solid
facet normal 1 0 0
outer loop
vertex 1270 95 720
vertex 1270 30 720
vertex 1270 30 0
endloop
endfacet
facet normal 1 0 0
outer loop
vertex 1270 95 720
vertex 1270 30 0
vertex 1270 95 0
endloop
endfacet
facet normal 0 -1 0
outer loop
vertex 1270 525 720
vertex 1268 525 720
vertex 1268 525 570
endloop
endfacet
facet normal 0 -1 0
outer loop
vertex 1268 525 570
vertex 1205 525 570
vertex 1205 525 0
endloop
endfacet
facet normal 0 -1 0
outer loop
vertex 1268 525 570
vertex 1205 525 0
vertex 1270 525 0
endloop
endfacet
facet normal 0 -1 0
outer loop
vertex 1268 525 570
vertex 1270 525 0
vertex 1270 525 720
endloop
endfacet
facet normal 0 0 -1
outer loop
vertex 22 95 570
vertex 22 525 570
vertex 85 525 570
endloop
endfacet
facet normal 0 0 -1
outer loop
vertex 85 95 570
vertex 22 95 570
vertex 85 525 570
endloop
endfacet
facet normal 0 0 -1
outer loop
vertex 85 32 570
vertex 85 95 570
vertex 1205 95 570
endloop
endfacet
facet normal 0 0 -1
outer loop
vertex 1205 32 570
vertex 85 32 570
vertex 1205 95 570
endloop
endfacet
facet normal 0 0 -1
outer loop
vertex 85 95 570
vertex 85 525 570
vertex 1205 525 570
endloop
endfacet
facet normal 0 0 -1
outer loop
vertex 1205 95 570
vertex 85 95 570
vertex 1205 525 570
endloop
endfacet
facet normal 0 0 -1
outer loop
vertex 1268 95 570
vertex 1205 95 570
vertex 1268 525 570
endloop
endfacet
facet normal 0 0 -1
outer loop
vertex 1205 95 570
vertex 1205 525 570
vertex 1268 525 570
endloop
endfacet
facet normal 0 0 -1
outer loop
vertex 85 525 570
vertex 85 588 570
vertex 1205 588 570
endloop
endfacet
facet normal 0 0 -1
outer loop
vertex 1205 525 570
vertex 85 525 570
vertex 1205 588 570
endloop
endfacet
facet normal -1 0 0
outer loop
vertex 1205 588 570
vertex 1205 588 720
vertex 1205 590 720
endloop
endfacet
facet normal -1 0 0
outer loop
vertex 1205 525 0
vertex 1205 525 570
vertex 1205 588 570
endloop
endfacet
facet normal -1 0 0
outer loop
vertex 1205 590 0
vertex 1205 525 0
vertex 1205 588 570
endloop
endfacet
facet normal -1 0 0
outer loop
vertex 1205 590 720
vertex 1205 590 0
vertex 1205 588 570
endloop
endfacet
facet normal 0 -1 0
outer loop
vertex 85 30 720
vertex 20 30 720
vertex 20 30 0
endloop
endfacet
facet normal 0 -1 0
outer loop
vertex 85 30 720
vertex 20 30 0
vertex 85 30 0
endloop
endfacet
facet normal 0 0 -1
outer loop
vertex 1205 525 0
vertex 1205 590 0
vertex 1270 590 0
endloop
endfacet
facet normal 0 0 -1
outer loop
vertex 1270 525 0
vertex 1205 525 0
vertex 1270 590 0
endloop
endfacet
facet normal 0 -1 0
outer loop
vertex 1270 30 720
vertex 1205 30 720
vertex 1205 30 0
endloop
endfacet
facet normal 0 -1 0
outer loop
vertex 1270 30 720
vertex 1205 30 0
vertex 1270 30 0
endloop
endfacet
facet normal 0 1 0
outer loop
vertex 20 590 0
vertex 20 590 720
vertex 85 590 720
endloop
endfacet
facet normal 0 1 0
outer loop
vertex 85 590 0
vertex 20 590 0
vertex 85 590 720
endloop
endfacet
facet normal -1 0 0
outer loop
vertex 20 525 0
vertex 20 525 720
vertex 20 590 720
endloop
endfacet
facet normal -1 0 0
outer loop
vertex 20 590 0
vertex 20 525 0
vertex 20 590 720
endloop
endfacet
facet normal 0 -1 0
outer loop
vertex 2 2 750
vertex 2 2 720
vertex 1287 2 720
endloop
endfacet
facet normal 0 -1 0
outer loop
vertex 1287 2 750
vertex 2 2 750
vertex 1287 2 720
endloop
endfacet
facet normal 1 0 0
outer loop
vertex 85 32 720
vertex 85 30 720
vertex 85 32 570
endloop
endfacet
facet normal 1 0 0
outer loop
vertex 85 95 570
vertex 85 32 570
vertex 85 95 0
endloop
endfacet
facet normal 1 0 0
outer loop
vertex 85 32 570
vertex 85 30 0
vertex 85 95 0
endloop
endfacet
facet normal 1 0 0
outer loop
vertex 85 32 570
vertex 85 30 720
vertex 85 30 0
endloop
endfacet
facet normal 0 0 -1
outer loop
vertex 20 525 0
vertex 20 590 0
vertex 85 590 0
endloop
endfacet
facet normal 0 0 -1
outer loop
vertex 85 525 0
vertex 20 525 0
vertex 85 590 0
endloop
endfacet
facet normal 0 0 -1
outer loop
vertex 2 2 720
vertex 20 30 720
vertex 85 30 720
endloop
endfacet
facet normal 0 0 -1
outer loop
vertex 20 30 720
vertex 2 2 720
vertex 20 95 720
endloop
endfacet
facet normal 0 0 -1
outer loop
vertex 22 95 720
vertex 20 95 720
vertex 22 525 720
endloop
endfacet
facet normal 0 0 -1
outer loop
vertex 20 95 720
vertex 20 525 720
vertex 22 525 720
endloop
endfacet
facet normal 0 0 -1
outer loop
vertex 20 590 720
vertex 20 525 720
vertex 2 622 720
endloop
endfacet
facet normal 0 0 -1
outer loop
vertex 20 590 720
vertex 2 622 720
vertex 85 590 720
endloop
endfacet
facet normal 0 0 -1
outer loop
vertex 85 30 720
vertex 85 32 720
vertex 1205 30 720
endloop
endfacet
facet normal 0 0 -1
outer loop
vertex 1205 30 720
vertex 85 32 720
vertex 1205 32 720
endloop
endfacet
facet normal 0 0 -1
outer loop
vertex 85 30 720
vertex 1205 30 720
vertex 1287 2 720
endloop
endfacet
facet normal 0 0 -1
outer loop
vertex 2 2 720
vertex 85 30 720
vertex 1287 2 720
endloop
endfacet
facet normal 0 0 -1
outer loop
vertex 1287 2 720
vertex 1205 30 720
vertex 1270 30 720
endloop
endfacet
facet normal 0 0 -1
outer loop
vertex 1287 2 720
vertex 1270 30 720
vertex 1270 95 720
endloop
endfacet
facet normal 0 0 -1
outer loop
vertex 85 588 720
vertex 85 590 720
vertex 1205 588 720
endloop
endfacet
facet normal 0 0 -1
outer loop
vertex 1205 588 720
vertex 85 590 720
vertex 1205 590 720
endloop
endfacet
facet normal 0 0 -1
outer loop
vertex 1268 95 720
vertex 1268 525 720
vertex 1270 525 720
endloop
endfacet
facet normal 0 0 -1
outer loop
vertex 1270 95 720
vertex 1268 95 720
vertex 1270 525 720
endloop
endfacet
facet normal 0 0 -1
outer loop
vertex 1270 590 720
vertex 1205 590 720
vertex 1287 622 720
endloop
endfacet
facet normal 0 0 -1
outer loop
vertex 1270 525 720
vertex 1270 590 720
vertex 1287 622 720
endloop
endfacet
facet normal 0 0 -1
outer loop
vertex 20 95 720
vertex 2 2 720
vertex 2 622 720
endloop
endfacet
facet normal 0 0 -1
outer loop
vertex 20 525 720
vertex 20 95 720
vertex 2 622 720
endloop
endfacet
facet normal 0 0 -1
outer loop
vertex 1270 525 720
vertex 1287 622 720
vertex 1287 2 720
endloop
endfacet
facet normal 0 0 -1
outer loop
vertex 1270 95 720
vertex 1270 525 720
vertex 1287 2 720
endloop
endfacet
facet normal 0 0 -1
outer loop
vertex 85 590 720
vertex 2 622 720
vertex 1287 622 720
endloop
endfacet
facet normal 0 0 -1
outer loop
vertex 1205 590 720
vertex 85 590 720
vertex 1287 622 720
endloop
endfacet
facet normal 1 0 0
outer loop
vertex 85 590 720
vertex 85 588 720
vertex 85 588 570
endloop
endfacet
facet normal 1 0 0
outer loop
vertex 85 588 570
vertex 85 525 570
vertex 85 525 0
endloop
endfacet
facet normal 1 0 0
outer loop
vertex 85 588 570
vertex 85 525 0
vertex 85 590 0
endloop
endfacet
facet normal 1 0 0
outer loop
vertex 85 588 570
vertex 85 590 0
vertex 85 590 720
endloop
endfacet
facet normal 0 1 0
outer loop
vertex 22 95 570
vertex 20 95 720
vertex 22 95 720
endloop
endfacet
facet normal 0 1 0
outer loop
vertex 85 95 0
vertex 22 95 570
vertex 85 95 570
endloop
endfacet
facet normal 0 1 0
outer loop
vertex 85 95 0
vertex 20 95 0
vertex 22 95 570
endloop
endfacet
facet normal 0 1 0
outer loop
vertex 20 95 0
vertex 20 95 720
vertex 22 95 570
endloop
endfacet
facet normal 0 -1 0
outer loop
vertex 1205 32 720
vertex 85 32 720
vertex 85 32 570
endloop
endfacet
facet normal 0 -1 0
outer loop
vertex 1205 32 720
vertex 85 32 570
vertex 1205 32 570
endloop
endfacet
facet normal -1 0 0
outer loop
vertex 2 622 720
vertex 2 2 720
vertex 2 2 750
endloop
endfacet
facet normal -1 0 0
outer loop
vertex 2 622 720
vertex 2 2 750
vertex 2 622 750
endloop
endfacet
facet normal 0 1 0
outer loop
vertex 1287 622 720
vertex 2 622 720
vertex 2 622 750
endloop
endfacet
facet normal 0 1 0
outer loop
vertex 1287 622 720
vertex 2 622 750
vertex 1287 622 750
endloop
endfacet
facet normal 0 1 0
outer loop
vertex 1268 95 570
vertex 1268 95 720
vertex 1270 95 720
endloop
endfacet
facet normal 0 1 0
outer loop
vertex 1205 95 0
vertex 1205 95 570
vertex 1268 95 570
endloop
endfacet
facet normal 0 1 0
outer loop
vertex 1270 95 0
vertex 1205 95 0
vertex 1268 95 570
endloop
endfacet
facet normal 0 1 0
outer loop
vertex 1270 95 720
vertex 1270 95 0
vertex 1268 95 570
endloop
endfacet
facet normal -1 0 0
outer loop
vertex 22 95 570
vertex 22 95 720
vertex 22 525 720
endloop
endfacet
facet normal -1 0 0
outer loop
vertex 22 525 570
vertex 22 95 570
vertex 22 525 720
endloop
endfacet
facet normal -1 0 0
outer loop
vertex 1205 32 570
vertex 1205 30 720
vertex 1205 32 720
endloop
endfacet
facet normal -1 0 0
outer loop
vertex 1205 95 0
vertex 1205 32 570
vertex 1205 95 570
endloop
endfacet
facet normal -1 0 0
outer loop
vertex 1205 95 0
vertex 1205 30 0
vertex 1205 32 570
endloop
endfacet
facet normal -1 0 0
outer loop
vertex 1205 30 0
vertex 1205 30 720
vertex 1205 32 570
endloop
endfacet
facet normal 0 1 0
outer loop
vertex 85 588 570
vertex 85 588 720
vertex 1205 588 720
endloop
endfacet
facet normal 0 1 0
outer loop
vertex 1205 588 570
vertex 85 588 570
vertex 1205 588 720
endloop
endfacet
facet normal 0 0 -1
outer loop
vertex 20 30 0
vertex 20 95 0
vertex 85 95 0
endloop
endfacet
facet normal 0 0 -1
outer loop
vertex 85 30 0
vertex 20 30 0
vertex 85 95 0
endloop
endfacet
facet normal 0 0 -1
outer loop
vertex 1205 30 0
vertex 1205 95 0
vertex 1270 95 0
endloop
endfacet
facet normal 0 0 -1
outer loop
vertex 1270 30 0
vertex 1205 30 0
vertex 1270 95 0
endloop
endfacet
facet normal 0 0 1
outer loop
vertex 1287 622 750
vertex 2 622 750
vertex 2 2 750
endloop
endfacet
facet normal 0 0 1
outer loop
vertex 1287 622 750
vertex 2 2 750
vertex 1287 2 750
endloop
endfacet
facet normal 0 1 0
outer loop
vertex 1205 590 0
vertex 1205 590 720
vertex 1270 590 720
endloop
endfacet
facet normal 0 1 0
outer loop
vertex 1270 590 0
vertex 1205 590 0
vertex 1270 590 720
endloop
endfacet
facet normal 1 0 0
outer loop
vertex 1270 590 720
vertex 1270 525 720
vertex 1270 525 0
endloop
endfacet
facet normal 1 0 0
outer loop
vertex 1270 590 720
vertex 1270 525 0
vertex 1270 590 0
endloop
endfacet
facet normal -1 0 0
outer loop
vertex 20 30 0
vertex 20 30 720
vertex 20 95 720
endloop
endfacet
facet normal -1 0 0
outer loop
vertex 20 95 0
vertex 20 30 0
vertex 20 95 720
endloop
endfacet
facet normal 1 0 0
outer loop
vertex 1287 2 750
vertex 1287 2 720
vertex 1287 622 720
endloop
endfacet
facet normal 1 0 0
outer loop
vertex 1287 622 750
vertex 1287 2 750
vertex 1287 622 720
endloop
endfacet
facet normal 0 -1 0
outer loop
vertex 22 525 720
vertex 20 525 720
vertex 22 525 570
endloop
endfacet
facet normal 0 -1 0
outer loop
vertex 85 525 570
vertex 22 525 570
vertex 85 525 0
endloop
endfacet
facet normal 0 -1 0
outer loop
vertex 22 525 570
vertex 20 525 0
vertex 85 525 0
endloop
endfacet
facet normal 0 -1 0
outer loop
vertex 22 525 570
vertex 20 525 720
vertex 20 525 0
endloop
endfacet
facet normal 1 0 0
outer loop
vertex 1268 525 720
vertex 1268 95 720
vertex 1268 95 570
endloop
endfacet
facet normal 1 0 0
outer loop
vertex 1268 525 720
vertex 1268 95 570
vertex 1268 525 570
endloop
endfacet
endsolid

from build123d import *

# Parameters (mm, degrees)
F1_W     = 65
F1_H     = 65
F2_DEPTH = 720
F3_W     = 1246
F3_H     = 556
F4_DEPTH = 150
F5_W     = 1285
F5_H     = 620
F6_DEPTH = 30


with BuildPart() as f2:
    # F1 (on Top) → F2 (new body, through all)
    with BuildSketch(Plane.XY):
        with Locations((52.5, 557.5)):
            Rectangle(F1_W, F1_H)
        with Locations((1237.5, 62.5)):
            Rectangle(F1_W, F1_H)
        with Locations((1237.5, 557.5)):
            Rectangle(F1_W, F1_H)
        with Locations((52.5, 62.5)):
            Rectangle(F1_W, F1_H)
    extrude(amount=F2_DEPTH)

    # F3 (on offset) → F4 (join)
    with BuildSketch(Plane.XY.offset(720)):
        with Locations((645, 310)):
            Rectangle(F3_W, F3_H)
    extrude(amount=-F4_DEPTH)

    # F5 (on offset) → F6 (join)
    with BuildSketch(Plane.XY.offset(720)):
        with Locations((644.5, 312)):
            Rectangle(F5_W, F5_H)
    extrude(amount=F6_DEPTH)


solid = f2.part
